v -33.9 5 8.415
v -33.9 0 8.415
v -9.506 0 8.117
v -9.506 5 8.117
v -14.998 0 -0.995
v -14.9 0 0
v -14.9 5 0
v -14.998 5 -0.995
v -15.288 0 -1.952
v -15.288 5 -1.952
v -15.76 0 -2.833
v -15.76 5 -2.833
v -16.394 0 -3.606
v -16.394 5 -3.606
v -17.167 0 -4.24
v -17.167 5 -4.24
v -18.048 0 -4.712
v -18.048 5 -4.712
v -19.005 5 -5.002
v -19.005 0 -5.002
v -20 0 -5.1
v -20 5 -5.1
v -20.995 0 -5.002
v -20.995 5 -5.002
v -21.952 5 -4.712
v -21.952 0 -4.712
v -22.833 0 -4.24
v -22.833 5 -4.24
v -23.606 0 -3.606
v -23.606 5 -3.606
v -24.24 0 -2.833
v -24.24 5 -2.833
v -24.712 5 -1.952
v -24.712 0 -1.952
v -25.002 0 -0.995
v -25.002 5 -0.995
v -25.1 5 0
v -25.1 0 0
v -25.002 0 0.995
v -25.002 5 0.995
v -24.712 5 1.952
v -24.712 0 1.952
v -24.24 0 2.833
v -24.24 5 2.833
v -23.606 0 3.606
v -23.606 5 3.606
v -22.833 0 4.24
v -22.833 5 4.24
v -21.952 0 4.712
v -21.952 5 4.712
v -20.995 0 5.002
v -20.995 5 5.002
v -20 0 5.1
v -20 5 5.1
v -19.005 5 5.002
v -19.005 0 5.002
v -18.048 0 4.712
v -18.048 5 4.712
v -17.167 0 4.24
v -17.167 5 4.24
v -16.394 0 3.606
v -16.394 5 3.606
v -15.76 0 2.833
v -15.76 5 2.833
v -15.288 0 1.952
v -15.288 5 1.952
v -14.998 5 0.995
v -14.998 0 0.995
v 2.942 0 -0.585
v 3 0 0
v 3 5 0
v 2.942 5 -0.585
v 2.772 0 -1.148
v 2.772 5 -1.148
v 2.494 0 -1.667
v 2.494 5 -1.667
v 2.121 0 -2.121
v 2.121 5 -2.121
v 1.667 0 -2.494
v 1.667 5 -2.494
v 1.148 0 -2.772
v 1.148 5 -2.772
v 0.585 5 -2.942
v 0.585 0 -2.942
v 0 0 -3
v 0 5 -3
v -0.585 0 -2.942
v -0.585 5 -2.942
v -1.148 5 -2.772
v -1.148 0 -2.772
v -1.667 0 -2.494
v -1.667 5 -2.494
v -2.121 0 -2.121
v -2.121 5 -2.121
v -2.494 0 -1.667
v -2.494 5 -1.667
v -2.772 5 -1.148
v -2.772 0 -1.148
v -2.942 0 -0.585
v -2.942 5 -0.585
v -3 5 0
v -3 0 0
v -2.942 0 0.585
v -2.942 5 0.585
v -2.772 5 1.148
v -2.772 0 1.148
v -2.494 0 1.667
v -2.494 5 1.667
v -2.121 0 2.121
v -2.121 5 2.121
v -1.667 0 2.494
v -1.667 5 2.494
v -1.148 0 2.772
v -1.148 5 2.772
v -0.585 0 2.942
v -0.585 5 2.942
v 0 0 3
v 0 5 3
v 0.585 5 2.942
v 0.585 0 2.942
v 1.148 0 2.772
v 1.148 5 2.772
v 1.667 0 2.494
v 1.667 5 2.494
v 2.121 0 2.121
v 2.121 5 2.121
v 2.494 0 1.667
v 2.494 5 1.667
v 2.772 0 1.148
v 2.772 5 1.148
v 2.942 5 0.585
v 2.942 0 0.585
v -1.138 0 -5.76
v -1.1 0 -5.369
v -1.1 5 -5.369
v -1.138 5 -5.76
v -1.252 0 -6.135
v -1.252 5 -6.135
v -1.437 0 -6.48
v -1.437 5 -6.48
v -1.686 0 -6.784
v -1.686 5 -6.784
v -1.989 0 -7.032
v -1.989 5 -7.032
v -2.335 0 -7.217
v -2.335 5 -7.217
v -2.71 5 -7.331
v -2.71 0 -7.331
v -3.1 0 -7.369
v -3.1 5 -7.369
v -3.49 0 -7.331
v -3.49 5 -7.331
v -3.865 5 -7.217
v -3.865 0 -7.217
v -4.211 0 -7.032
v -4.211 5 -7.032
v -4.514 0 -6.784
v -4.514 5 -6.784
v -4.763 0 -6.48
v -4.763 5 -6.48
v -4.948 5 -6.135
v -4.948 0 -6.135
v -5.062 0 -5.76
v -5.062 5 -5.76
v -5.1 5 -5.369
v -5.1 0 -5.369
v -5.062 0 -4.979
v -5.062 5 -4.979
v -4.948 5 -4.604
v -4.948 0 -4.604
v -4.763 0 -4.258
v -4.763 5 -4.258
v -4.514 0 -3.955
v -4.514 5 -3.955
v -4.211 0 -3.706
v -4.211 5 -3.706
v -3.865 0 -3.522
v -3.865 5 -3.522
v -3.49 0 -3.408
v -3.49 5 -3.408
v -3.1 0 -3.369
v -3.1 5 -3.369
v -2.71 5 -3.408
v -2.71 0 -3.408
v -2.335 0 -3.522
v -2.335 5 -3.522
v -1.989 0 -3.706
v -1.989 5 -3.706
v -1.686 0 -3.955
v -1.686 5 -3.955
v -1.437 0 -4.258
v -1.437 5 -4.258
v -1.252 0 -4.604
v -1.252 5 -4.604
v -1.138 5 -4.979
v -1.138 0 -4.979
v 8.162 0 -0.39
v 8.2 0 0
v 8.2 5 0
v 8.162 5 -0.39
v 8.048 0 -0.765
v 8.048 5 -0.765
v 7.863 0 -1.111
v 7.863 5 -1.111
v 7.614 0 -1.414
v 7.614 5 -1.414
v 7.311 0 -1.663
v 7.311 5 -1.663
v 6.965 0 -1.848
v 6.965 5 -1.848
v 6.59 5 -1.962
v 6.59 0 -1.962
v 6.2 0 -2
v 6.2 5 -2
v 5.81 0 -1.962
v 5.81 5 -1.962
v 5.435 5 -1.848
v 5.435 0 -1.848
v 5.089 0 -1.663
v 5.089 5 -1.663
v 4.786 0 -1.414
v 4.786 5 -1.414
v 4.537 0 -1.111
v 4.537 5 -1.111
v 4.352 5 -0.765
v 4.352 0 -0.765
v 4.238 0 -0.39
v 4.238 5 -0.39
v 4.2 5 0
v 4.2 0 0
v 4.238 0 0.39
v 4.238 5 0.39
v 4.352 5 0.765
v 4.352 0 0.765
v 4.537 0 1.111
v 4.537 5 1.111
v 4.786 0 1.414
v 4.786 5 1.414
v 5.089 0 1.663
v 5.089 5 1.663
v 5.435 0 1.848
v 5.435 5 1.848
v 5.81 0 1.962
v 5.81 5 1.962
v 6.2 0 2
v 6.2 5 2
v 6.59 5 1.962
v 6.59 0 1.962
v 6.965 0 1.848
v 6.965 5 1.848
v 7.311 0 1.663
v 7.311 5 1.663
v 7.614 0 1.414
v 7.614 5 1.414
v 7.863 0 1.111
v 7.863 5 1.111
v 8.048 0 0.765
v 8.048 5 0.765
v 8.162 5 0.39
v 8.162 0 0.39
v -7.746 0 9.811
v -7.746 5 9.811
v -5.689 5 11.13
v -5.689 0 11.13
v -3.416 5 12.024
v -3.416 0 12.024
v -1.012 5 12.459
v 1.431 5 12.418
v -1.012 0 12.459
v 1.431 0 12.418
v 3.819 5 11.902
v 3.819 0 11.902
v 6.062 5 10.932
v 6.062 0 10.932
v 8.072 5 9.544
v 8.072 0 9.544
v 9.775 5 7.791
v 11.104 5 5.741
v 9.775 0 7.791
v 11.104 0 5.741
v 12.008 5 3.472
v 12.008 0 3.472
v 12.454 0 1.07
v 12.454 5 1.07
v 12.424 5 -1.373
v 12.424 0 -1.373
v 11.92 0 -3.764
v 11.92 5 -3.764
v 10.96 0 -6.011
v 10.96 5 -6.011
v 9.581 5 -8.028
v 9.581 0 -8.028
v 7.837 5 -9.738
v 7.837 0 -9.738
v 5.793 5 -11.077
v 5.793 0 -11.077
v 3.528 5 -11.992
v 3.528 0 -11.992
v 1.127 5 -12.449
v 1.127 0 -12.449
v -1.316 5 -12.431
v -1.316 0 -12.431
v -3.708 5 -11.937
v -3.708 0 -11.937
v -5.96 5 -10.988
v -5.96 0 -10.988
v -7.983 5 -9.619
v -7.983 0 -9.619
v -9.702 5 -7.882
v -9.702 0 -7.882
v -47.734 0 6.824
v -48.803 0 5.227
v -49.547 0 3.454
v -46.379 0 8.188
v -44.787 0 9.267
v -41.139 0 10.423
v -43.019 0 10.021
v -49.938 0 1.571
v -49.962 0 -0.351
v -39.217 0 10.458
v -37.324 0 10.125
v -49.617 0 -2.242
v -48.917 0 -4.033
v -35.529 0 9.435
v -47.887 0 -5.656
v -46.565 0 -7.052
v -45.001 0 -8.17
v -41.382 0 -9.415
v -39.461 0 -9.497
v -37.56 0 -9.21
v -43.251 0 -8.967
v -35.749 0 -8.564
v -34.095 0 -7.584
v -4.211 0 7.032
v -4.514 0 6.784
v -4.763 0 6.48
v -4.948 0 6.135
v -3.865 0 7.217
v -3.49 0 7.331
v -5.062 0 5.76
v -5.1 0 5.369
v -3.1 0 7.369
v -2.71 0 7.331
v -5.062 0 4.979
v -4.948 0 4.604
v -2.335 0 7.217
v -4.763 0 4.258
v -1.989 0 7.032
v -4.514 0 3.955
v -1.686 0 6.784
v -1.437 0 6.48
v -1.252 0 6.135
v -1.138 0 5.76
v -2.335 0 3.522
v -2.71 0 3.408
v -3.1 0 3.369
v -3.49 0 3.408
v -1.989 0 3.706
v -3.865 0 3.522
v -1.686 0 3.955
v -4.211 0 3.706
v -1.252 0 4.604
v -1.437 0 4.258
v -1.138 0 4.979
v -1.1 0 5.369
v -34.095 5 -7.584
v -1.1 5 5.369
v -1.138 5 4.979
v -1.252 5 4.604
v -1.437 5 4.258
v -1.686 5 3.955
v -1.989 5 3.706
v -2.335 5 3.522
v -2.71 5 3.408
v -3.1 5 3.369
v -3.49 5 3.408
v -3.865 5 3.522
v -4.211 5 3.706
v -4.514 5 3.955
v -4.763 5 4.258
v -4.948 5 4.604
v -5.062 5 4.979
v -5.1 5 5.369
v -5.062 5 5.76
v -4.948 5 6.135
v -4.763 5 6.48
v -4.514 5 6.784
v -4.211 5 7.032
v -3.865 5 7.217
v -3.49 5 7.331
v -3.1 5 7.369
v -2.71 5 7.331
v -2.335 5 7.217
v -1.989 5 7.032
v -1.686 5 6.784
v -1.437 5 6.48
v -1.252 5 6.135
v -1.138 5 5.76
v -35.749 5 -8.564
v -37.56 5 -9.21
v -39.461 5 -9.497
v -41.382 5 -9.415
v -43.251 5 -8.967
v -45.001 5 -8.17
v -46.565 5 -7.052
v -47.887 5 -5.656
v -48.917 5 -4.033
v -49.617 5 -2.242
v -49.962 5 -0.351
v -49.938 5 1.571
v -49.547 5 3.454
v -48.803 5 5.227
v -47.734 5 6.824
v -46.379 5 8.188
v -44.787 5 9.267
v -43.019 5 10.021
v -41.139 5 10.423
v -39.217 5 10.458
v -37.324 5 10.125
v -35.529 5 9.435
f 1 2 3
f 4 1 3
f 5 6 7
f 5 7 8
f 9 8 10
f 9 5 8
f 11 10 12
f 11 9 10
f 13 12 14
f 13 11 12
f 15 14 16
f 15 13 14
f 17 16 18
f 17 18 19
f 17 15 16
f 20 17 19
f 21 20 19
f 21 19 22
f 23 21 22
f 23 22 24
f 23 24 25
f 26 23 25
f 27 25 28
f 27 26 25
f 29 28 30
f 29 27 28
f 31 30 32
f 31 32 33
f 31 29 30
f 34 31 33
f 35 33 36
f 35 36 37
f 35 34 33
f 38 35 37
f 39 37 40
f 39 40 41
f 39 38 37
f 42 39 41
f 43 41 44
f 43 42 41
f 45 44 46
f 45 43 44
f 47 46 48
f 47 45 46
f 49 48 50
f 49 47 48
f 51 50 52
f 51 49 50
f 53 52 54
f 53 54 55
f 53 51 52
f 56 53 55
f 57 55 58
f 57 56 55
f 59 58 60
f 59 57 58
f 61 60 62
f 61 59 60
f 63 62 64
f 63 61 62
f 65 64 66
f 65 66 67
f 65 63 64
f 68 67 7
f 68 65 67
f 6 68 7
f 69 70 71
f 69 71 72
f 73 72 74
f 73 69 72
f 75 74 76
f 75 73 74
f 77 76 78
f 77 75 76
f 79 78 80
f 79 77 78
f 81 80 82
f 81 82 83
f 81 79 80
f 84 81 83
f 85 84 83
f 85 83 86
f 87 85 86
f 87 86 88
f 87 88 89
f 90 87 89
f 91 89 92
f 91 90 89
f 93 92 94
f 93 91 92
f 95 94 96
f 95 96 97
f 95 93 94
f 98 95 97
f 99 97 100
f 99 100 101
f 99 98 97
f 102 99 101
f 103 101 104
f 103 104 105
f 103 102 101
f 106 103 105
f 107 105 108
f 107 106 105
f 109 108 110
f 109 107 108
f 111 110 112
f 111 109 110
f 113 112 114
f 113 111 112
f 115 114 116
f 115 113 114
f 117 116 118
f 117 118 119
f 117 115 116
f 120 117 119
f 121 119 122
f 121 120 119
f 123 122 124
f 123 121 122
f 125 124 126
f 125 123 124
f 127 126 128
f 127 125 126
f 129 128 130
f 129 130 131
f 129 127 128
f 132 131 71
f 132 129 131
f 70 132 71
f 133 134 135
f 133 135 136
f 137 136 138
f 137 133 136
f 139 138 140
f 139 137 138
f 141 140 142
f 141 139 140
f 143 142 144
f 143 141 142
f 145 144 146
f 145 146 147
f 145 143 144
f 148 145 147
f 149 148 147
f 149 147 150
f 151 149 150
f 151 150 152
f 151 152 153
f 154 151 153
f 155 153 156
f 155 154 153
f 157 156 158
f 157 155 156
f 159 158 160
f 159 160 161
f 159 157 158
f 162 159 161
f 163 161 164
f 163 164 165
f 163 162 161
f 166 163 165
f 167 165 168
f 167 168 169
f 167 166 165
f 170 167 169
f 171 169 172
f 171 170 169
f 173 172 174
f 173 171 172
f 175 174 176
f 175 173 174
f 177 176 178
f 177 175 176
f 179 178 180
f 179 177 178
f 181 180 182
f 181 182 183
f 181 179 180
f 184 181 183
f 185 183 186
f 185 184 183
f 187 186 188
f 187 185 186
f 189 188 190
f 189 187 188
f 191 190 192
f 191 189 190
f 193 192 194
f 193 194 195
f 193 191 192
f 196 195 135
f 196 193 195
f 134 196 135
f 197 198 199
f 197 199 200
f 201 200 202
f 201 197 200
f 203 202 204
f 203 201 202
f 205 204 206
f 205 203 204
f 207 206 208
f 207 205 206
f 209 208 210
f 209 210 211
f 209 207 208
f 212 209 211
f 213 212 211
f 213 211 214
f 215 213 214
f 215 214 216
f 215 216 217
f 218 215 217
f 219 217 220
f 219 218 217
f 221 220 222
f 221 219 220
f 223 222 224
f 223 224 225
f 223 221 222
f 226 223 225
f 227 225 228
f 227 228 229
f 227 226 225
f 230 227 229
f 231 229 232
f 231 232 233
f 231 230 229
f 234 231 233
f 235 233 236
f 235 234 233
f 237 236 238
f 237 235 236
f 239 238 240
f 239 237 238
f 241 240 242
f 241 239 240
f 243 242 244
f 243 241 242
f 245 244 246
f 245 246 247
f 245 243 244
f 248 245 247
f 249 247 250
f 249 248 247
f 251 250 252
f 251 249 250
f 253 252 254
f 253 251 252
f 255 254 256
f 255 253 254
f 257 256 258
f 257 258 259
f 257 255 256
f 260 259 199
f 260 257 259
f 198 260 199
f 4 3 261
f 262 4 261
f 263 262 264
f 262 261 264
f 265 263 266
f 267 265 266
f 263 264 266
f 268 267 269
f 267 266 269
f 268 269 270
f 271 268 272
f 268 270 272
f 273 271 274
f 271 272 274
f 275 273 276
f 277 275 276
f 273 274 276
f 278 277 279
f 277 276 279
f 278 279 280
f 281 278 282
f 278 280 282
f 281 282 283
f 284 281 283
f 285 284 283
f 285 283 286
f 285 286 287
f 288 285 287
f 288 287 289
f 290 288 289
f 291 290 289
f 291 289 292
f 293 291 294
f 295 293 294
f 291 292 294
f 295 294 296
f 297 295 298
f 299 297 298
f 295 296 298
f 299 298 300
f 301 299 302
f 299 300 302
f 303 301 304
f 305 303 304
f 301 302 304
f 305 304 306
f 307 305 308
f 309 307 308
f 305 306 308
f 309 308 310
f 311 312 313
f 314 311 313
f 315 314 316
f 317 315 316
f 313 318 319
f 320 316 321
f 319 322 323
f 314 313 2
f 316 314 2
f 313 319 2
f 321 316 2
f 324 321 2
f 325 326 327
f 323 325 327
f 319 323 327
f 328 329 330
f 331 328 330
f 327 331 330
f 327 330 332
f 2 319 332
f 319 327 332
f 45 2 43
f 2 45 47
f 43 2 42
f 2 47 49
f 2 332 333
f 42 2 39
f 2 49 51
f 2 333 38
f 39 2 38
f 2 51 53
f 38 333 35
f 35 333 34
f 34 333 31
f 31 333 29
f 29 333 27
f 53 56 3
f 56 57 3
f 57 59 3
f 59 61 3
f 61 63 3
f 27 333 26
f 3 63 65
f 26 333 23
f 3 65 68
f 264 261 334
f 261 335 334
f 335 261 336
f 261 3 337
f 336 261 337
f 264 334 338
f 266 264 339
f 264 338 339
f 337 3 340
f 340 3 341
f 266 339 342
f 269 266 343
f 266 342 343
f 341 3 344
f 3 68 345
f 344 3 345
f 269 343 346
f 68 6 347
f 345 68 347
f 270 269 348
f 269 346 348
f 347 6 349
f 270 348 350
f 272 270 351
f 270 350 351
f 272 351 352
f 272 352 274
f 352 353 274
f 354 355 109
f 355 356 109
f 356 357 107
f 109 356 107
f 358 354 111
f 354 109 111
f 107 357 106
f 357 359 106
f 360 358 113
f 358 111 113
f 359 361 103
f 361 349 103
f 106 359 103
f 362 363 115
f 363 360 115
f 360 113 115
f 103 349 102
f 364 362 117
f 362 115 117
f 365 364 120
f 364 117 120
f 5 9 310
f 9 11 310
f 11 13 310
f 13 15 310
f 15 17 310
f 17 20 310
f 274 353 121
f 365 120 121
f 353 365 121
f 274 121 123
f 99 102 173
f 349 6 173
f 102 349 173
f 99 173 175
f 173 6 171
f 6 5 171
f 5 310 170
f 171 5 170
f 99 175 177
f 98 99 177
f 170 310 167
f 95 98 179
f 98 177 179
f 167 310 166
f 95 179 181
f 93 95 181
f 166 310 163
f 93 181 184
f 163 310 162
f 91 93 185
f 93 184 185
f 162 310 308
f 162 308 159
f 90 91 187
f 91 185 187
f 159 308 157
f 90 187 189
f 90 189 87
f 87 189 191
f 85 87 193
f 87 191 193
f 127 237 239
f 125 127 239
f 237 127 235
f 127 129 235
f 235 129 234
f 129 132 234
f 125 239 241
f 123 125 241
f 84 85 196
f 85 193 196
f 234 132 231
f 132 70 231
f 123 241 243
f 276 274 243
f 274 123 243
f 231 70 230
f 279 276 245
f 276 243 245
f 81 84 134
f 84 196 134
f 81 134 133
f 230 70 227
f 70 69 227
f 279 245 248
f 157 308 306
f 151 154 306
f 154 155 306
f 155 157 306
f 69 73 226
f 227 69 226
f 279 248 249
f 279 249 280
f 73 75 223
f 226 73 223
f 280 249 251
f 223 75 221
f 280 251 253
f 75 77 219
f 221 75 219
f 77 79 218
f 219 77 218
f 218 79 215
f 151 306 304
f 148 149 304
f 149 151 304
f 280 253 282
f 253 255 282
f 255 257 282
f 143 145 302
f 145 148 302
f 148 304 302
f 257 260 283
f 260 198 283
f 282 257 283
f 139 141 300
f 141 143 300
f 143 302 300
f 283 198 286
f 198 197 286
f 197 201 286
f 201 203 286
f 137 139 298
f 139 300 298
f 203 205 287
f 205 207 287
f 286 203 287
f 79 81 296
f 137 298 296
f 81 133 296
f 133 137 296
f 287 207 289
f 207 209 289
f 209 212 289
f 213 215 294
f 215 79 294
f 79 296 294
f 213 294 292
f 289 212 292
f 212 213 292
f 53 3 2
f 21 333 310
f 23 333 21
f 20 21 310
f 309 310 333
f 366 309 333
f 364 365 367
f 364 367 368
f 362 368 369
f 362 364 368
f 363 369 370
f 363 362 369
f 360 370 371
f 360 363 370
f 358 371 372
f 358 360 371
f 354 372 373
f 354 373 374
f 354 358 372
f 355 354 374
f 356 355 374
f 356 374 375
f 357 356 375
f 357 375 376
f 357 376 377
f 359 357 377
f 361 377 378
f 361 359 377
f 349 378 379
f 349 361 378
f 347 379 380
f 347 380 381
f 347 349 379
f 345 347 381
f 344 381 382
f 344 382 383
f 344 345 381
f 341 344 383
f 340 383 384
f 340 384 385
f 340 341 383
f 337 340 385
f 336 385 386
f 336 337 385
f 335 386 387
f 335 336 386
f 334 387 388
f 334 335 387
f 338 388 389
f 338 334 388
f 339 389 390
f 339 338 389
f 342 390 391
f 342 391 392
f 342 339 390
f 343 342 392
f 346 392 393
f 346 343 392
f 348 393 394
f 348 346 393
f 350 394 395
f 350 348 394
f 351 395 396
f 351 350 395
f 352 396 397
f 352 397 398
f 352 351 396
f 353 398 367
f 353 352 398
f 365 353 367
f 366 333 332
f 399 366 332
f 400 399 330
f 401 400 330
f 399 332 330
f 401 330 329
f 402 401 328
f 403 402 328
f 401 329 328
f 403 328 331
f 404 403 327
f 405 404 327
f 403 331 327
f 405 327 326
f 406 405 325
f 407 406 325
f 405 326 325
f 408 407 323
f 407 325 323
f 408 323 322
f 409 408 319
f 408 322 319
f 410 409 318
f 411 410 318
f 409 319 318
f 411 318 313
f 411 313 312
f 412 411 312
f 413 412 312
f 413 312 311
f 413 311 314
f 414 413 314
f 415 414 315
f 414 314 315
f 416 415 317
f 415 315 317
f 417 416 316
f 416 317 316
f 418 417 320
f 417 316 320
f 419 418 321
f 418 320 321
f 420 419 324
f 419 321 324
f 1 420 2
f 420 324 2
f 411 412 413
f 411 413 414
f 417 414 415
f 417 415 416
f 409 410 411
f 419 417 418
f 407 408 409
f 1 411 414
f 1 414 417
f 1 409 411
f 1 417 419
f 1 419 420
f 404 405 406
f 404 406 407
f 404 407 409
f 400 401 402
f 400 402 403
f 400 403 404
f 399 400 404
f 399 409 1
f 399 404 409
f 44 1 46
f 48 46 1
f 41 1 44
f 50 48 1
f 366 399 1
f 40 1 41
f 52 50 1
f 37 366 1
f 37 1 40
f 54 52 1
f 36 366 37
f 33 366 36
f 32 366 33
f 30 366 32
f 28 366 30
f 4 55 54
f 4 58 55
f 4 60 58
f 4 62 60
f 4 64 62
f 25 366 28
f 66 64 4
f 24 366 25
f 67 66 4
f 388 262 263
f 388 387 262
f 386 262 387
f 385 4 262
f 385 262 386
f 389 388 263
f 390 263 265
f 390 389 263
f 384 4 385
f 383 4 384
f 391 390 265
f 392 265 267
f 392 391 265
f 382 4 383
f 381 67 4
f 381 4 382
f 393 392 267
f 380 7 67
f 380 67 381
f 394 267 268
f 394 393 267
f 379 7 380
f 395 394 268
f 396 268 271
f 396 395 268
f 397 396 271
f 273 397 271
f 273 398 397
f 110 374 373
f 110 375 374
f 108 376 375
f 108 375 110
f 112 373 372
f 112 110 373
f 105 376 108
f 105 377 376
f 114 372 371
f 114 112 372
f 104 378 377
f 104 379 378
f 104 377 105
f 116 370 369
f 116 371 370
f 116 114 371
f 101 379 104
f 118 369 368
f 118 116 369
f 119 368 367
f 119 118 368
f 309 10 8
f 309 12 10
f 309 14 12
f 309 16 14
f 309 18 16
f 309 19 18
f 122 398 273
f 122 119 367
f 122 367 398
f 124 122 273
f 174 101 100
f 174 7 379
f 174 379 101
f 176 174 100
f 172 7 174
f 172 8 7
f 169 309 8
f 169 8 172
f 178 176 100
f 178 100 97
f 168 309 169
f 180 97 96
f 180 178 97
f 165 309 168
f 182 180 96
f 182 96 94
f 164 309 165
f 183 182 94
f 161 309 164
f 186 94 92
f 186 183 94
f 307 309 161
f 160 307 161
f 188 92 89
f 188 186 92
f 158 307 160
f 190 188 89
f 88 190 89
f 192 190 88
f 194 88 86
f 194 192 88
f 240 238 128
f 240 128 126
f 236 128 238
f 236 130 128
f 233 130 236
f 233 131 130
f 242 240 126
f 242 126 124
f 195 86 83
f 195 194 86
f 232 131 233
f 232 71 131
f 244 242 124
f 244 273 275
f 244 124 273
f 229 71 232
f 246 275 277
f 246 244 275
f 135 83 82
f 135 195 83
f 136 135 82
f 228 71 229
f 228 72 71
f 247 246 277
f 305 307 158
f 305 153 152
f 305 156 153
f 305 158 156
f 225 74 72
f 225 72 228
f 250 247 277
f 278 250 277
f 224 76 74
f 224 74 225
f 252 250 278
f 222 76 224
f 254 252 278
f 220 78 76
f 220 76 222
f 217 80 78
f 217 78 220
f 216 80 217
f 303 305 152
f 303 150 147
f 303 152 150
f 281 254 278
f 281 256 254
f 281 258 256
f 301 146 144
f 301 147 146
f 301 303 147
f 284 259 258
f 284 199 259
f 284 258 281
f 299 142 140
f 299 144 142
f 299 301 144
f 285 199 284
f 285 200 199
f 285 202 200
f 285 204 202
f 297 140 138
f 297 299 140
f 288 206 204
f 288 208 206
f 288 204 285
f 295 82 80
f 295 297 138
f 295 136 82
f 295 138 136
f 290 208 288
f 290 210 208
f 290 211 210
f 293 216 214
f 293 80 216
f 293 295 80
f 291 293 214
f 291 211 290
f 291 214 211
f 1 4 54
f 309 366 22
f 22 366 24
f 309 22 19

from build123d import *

# Parameters (mm, degrees)
SKETCH1_R           = 5.1
SKETCH1_R_2         = 2
SKETCH1_R_3         = 3
BOSS_EXTRUDE1_DEPTH = 5


with BuildPart() as part:
    # Sketch1 → Boss-Extrude1 (new body)
    with BuildSketch(Plane(origin=(0, 0, 0), x_dir=(1, 0, 0), z_dir=(0, 1, 0))):
        with BuildLine():
            Line((-33.899726562, -8.414780986), (-9.506233548, -8.116743419))
            ThreePointArc((-9.506233548, -8.116743419), (12.499067121, 0.15271251), (-9.701705562, 7.882062496))
            Line((-9.701705562, 7.882062496), (-34.095198575, 7.584024929))
            ThreePointArc((-34.095198575, 7.584024929), (-49.996268483, -0.610850042), (-33.899726562, -8.414780986))
        make_face()
        with Locations((-20, 0)):
            Circle(SKETCH1_R, mode=Mode.SUBTRACT)
        with Locations((-3.1, 5.369357503)):
            Circle(SKETCH1_R_2, mode=Mode.SUBTRACT)
        with Locations((-3.1, -5.369357503)):
            Circle(SKETCH1_R_2, mode=Mode.SUBTRACT)
        Circle(SKETCH1_R_3, mode=Mode.SUBTRACT)
        with Locations((6.2, 0)):
            Circle(SKETCH1_R_2, mode=Mode.SUBTRACT)
    extrude(amount=BOSS_EXTRUDE1_DEPTH)


solid = part.part
